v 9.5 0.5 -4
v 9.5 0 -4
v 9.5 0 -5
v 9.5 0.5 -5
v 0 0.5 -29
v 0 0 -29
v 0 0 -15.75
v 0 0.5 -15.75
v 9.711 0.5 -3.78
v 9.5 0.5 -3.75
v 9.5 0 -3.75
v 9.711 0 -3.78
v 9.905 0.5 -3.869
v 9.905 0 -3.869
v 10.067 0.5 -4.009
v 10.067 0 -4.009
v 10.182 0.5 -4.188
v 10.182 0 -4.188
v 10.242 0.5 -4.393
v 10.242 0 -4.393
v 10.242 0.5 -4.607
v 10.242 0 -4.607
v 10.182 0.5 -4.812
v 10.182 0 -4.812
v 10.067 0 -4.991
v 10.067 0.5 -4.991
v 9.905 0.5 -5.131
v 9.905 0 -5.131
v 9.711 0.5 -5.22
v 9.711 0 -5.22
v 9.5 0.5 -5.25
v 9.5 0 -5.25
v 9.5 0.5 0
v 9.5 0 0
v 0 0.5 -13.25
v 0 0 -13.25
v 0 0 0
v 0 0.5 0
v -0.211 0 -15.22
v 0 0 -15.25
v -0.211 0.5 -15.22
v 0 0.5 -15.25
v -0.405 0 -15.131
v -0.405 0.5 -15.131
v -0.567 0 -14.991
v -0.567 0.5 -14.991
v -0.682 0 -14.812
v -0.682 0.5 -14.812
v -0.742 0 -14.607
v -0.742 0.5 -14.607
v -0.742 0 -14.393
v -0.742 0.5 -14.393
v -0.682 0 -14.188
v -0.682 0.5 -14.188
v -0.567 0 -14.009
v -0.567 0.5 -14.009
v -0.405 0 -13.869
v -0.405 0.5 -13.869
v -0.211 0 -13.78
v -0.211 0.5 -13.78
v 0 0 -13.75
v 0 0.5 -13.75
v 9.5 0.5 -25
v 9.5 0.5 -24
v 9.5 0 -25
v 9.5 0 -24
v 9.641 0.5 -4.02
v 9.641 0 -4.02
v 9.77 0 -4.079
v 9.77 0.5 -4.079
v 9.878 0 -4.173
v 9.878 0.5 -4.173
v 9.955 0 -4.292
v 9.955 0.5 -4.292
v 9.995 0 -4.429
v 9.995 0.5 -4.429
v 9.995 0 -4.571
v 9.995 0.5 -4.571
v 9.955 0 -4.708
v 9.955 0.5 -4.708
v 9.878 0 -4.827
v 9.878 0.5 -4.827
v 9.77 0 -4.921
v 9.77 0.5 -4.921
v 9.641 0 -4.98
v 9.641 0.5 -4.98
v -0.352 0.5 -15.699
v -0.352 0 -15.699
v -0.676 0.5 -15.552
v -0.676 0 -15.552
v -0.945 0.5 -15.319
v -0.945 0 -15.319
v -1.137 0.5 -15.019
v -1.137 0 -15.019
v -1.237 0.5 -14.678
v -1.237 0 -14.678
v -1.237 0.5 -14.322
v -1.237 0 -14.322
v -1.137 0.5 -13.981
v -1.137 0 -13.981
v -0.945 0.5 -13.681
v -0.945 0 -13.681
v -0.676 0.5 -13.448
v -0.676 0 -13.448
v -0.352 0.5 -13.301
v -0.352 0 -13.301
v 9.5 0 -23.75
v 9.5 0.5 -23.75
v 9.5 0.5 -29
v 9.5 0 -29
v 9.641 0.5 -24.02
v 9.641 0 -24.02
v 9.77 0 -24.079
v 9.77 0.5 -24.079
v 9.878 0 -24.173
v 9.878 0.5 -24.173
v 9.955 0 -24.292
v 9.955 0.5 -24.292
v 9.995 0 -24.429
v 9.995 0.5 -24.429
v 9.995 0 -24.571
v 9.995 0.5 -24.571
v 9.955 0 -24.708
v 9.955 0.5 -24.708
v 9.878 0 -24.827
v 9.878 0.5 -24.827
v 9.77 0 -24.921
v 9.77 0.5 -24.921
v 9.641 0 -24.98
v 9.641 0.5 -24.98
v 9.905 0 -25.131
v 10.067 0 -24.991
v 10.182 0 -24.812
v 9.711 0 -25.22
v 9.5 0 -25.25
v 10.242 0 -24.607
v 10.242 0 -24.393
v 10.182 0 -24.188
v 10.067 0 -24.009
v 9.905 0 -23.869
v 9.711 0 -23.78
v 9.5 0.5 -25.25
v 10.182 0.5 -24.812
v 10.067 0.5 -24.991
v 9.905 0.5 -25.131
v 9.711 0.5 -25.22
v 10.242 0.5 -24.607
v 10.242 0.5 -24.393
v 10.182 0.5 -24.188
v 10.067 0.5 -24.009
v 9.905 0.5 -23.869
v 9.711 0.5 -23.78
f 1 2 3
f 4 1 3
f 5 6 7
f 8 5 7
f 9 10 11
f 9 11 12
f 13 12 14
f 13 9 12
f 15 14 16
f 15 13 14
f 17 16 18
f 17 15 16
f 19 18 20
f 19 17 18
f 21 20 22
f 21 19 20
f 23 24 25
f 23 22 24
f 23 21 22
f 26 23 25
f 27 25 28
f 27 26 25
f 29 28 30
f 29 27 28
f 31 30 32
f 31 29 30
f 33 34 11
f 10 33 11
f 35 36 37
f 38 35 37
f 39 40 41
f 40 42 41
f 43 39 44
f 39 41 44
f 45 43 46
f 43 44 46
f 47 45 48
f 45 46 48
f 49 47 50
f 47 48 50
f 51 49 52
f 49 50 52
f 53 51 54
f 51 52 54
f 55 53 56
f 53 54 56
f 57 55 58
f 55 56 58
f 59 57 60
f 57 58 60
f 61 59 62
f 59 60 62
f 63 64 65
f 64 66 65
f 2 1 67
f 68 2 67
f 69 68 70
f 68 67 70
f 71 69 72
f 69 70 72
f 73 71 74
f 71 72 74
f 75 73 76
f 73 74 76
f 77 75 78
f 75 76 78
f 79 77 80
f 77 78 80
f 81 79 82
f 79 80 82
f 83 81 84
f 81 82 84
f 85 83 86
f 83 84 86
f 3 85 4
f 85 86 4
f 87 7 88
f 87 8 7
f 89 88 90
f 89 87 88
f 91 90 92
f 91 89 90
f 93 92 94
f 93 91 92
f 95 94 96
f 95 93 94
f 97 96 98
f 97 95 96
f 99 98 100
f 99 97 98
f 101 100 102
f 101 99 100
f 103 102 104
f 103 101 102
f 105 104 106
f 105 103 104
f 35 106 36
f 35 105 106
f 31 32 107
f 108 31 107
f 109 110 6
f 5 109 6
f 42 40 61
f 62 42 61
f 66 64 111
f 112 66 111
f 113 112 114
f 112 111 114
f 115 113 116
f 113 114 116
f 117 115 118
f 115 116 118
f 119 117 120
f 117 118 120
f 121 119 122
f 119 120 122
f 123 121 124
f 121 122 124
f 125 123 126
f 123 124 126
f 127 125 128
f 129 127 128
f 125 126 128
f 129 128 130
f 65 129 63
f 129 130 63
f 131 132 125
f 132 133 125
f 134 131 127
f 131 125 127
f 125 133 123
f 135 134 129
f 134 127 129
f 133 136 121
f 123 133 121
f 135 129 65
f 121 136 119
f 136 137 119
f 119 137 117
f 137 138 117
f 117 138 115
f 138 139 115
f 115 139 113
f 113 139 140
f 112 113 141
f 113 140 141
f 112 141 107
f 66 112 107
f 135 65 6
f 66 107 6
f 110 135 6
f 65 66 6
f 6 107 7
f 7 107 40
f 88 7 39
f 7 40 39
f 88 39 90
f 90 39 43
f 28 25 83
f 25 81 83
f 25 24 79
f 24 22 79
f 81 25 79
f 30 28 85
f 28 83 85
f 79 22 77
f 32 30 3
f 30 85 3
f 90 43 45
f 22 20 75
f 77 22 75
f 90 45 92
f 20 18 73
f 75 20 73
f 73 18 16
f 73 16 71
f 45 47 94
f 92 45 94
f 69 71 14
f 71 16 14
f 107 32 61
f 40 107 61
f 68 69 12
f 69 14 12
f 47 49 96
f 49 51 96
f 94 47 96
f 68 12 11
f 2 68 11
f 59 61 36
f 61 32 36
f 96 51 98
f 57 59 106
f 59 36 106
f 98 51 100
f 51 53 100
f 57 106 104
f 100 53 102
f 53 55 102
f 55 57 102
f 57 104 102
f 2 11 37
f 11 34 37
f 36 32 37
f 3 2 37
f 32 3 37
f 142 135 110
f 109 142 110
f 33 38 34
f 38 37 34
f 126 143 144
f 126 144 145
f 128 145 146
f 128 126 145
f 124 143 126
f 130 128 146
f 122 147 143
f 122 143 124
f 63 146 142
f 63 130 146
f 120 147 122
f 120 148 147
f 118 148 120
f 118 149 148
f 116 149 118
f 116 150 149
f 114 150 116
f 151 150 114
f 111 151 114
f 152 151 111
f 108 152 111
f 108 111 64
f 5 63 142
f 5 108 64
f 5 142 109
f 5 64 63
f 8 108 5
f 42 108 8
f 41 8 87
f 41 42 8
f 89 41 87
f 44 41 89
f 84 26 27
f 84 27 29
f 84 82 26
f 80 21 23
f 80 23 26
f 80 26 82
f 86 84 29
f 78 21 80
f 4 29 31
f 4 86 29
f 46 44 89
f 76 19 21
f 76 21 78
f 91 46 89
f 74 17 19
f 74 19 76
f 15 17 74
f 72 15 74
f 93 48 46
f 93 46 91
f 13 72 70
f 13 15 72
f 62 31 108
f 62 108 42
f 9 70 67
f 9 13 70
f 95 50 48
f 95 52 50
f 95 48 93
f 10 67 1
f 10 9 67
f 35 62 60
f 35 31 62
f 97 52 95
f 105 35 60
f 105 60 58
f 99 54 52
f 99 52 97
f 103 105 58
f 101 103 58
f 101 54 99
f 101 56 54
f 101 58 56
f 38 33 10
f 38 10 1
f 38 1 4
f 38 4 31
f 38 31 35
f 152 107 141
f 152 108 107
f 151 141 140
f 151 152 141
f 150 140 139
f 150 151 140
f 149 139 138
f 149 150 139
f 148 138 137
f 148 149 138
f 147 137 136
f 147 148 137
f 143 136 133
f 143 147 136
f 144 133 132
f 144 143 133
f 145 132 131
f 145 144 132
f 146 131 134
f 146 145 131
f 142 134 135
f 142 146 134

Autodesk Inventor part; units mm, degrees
ref_plane "YZ Plane" through (0, 0, 0) normal (1, 0, 0) x (0, 1, 0)
ref_plane "XZ Plane" through (0, 0, 0) normal (0, 1, 0) x (-1, 0, 0)
ref_plane "XY Plane" through (0, 0, 0) normal (0, 0, 1) x (1, 0, 0)
sketch "Sketch1" plane through (0, 0, 0) normal (0, 1, 0) x (-1, 0, 0)
  line L0 (0, 0) -> (-9.5, 0)
  line L1 (-9.5, 0) -> (-9.5, -29)
  line L2 (-9.5, -29) -> (0, -29)
  line L3 (0, -29) -> (0, 0)
  dimension "d0" = 9.5
  dimension "d1" = 29
extrude "Extrusion1" add sketch "Sketch1" along normal blind 0.5
sketch "Sketch3" plane through (0, 0.5, 0) normal (0, 1, 0) x (1, 0, 0)
  circle A0 centre (9.5, 24.5) radius 0.75
  circle A1 centre (9.5, 24.5) radius 0.5
  circle A2 centre (9.5, 4.5) radius 0.75
  circle A3 centre (9.5, 4.5) radius 0.5
  point P0 (0, 0)
  point P1 (9.5, 0)
  point P2 (9.5, 29)
  dimension "d6" = 1.5
  dimension "d7" = 1
  dimension "d8" = 1.5
  dimension "d9" = 1
extrude "Extrusion2" add sketch "Sketch3" against normal blind 0.5
sketch "Sketch4" plane through (0, 0.5, 0) normal (0, 1, 0) x (1, 0, 0)
  line L0 (0, 29) -> (0, 0) projected
  line L1 (0, 29) -> (0, 14.5)
  circle A0 centre (0, 14.5) radius 1.25
  circle A1 centre (0, 14.5) radius 0.75
  point P0 (0, 13.75)
  point P1 (0, 15.25)
  point P2 (0, 15.75)
  point P3 (0, 13.25)
  dimension "d12" = 14.5
  dimension "d13" = 2.5
  dimension "d14" = 1.5
extrude "Extrusion3" add sketch "Sketch4" against normal blind 0.5 contours L0 A1 A0 picked at (-1.0514, 14.2719)
properties part number "Shelf"
